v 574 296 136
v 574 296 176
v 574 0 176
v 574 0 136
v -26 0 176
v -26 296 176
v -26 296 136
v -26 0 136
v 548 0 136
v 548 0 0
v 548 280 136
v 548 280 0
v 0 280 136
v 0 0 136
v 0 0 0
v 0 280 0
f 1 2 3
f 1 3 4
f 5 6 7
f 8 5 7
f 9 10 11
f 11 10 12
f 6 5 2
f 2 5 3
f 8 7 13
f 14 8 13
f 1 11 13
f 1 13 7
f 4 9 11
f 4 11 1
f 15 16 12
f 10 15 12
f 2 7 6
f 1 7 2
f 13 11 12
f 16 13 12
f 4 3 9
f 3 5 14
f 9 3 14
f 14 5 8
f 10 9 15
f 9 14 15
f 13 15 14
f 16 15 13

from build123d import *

# Parameters (mm, degrees)
ESBO_O1_W                = 548
ESBO_O1_H                = 280
RESSALTO_EXTRUS_O1_DEPTH = 176
ESBO_O2_W                = 40
ESBO_O2_H                = 280
RESSALTO_EXTRUS_O2_DEPTH = 26
ESBO_O3_W                = 40
ESBO_O3_H                = 280
RESSALTO_EXTRUS_O3_DEPTH = 26
ESBO_O4_W                = 600
ESBO_O4_H                = 40
RESSALTO_EXTRUS_O4_DEPTH = 16


with BuildPart() as part:
    # Esboço1 → Ressalto-extrusão1 (new body)
    with BuildSketch(Plane.XY):
        with Locations((274, 140)):
            Rectangle(ESBO_O1_W, ESBO_O1_H)
    extrude(amount=RESSALTO_EXTRUS_O1_DEPTH)

    # Esboço2 → Ressalto-extrusão2 (add)
    with BuildSketch(Plane.ZY):
        with Locations((156, 140)):
            Rectangle(ESBO_O2_W, ESBO_O2_H)
    extrude(amount=RESSALTO_EXTRUS_O2_DEPTH)

    # Esboço3 → Ressalto-extrusão3 (add)
    with BuildSketch(Plane(origin=(548, 0, 0), x_dir=(0, 0, -1), z_dir=(1, 0, 0))):
        with Locations((-156, 140)):
            Rectangle(ESBO_O3_W, ESBO_O3_H)
    extrude(amount=RESSALTO_EXTRUS_O3_DEPTH)

    # Esboço4 → Ressalto-extrusão4 (add)
    with BuildSketch(Plane(origin=(0, 280, 0), x_dir=(1, 0, 0), z_dir=(0, 1, 0))):
        with Locations((274, -156)):
            Rectangle(ESBO_O4_W, ESBO_O4_H)
    extrude(amount=RESSALTO_EXTRUS_O4_DEPTH)


solid = part.part
